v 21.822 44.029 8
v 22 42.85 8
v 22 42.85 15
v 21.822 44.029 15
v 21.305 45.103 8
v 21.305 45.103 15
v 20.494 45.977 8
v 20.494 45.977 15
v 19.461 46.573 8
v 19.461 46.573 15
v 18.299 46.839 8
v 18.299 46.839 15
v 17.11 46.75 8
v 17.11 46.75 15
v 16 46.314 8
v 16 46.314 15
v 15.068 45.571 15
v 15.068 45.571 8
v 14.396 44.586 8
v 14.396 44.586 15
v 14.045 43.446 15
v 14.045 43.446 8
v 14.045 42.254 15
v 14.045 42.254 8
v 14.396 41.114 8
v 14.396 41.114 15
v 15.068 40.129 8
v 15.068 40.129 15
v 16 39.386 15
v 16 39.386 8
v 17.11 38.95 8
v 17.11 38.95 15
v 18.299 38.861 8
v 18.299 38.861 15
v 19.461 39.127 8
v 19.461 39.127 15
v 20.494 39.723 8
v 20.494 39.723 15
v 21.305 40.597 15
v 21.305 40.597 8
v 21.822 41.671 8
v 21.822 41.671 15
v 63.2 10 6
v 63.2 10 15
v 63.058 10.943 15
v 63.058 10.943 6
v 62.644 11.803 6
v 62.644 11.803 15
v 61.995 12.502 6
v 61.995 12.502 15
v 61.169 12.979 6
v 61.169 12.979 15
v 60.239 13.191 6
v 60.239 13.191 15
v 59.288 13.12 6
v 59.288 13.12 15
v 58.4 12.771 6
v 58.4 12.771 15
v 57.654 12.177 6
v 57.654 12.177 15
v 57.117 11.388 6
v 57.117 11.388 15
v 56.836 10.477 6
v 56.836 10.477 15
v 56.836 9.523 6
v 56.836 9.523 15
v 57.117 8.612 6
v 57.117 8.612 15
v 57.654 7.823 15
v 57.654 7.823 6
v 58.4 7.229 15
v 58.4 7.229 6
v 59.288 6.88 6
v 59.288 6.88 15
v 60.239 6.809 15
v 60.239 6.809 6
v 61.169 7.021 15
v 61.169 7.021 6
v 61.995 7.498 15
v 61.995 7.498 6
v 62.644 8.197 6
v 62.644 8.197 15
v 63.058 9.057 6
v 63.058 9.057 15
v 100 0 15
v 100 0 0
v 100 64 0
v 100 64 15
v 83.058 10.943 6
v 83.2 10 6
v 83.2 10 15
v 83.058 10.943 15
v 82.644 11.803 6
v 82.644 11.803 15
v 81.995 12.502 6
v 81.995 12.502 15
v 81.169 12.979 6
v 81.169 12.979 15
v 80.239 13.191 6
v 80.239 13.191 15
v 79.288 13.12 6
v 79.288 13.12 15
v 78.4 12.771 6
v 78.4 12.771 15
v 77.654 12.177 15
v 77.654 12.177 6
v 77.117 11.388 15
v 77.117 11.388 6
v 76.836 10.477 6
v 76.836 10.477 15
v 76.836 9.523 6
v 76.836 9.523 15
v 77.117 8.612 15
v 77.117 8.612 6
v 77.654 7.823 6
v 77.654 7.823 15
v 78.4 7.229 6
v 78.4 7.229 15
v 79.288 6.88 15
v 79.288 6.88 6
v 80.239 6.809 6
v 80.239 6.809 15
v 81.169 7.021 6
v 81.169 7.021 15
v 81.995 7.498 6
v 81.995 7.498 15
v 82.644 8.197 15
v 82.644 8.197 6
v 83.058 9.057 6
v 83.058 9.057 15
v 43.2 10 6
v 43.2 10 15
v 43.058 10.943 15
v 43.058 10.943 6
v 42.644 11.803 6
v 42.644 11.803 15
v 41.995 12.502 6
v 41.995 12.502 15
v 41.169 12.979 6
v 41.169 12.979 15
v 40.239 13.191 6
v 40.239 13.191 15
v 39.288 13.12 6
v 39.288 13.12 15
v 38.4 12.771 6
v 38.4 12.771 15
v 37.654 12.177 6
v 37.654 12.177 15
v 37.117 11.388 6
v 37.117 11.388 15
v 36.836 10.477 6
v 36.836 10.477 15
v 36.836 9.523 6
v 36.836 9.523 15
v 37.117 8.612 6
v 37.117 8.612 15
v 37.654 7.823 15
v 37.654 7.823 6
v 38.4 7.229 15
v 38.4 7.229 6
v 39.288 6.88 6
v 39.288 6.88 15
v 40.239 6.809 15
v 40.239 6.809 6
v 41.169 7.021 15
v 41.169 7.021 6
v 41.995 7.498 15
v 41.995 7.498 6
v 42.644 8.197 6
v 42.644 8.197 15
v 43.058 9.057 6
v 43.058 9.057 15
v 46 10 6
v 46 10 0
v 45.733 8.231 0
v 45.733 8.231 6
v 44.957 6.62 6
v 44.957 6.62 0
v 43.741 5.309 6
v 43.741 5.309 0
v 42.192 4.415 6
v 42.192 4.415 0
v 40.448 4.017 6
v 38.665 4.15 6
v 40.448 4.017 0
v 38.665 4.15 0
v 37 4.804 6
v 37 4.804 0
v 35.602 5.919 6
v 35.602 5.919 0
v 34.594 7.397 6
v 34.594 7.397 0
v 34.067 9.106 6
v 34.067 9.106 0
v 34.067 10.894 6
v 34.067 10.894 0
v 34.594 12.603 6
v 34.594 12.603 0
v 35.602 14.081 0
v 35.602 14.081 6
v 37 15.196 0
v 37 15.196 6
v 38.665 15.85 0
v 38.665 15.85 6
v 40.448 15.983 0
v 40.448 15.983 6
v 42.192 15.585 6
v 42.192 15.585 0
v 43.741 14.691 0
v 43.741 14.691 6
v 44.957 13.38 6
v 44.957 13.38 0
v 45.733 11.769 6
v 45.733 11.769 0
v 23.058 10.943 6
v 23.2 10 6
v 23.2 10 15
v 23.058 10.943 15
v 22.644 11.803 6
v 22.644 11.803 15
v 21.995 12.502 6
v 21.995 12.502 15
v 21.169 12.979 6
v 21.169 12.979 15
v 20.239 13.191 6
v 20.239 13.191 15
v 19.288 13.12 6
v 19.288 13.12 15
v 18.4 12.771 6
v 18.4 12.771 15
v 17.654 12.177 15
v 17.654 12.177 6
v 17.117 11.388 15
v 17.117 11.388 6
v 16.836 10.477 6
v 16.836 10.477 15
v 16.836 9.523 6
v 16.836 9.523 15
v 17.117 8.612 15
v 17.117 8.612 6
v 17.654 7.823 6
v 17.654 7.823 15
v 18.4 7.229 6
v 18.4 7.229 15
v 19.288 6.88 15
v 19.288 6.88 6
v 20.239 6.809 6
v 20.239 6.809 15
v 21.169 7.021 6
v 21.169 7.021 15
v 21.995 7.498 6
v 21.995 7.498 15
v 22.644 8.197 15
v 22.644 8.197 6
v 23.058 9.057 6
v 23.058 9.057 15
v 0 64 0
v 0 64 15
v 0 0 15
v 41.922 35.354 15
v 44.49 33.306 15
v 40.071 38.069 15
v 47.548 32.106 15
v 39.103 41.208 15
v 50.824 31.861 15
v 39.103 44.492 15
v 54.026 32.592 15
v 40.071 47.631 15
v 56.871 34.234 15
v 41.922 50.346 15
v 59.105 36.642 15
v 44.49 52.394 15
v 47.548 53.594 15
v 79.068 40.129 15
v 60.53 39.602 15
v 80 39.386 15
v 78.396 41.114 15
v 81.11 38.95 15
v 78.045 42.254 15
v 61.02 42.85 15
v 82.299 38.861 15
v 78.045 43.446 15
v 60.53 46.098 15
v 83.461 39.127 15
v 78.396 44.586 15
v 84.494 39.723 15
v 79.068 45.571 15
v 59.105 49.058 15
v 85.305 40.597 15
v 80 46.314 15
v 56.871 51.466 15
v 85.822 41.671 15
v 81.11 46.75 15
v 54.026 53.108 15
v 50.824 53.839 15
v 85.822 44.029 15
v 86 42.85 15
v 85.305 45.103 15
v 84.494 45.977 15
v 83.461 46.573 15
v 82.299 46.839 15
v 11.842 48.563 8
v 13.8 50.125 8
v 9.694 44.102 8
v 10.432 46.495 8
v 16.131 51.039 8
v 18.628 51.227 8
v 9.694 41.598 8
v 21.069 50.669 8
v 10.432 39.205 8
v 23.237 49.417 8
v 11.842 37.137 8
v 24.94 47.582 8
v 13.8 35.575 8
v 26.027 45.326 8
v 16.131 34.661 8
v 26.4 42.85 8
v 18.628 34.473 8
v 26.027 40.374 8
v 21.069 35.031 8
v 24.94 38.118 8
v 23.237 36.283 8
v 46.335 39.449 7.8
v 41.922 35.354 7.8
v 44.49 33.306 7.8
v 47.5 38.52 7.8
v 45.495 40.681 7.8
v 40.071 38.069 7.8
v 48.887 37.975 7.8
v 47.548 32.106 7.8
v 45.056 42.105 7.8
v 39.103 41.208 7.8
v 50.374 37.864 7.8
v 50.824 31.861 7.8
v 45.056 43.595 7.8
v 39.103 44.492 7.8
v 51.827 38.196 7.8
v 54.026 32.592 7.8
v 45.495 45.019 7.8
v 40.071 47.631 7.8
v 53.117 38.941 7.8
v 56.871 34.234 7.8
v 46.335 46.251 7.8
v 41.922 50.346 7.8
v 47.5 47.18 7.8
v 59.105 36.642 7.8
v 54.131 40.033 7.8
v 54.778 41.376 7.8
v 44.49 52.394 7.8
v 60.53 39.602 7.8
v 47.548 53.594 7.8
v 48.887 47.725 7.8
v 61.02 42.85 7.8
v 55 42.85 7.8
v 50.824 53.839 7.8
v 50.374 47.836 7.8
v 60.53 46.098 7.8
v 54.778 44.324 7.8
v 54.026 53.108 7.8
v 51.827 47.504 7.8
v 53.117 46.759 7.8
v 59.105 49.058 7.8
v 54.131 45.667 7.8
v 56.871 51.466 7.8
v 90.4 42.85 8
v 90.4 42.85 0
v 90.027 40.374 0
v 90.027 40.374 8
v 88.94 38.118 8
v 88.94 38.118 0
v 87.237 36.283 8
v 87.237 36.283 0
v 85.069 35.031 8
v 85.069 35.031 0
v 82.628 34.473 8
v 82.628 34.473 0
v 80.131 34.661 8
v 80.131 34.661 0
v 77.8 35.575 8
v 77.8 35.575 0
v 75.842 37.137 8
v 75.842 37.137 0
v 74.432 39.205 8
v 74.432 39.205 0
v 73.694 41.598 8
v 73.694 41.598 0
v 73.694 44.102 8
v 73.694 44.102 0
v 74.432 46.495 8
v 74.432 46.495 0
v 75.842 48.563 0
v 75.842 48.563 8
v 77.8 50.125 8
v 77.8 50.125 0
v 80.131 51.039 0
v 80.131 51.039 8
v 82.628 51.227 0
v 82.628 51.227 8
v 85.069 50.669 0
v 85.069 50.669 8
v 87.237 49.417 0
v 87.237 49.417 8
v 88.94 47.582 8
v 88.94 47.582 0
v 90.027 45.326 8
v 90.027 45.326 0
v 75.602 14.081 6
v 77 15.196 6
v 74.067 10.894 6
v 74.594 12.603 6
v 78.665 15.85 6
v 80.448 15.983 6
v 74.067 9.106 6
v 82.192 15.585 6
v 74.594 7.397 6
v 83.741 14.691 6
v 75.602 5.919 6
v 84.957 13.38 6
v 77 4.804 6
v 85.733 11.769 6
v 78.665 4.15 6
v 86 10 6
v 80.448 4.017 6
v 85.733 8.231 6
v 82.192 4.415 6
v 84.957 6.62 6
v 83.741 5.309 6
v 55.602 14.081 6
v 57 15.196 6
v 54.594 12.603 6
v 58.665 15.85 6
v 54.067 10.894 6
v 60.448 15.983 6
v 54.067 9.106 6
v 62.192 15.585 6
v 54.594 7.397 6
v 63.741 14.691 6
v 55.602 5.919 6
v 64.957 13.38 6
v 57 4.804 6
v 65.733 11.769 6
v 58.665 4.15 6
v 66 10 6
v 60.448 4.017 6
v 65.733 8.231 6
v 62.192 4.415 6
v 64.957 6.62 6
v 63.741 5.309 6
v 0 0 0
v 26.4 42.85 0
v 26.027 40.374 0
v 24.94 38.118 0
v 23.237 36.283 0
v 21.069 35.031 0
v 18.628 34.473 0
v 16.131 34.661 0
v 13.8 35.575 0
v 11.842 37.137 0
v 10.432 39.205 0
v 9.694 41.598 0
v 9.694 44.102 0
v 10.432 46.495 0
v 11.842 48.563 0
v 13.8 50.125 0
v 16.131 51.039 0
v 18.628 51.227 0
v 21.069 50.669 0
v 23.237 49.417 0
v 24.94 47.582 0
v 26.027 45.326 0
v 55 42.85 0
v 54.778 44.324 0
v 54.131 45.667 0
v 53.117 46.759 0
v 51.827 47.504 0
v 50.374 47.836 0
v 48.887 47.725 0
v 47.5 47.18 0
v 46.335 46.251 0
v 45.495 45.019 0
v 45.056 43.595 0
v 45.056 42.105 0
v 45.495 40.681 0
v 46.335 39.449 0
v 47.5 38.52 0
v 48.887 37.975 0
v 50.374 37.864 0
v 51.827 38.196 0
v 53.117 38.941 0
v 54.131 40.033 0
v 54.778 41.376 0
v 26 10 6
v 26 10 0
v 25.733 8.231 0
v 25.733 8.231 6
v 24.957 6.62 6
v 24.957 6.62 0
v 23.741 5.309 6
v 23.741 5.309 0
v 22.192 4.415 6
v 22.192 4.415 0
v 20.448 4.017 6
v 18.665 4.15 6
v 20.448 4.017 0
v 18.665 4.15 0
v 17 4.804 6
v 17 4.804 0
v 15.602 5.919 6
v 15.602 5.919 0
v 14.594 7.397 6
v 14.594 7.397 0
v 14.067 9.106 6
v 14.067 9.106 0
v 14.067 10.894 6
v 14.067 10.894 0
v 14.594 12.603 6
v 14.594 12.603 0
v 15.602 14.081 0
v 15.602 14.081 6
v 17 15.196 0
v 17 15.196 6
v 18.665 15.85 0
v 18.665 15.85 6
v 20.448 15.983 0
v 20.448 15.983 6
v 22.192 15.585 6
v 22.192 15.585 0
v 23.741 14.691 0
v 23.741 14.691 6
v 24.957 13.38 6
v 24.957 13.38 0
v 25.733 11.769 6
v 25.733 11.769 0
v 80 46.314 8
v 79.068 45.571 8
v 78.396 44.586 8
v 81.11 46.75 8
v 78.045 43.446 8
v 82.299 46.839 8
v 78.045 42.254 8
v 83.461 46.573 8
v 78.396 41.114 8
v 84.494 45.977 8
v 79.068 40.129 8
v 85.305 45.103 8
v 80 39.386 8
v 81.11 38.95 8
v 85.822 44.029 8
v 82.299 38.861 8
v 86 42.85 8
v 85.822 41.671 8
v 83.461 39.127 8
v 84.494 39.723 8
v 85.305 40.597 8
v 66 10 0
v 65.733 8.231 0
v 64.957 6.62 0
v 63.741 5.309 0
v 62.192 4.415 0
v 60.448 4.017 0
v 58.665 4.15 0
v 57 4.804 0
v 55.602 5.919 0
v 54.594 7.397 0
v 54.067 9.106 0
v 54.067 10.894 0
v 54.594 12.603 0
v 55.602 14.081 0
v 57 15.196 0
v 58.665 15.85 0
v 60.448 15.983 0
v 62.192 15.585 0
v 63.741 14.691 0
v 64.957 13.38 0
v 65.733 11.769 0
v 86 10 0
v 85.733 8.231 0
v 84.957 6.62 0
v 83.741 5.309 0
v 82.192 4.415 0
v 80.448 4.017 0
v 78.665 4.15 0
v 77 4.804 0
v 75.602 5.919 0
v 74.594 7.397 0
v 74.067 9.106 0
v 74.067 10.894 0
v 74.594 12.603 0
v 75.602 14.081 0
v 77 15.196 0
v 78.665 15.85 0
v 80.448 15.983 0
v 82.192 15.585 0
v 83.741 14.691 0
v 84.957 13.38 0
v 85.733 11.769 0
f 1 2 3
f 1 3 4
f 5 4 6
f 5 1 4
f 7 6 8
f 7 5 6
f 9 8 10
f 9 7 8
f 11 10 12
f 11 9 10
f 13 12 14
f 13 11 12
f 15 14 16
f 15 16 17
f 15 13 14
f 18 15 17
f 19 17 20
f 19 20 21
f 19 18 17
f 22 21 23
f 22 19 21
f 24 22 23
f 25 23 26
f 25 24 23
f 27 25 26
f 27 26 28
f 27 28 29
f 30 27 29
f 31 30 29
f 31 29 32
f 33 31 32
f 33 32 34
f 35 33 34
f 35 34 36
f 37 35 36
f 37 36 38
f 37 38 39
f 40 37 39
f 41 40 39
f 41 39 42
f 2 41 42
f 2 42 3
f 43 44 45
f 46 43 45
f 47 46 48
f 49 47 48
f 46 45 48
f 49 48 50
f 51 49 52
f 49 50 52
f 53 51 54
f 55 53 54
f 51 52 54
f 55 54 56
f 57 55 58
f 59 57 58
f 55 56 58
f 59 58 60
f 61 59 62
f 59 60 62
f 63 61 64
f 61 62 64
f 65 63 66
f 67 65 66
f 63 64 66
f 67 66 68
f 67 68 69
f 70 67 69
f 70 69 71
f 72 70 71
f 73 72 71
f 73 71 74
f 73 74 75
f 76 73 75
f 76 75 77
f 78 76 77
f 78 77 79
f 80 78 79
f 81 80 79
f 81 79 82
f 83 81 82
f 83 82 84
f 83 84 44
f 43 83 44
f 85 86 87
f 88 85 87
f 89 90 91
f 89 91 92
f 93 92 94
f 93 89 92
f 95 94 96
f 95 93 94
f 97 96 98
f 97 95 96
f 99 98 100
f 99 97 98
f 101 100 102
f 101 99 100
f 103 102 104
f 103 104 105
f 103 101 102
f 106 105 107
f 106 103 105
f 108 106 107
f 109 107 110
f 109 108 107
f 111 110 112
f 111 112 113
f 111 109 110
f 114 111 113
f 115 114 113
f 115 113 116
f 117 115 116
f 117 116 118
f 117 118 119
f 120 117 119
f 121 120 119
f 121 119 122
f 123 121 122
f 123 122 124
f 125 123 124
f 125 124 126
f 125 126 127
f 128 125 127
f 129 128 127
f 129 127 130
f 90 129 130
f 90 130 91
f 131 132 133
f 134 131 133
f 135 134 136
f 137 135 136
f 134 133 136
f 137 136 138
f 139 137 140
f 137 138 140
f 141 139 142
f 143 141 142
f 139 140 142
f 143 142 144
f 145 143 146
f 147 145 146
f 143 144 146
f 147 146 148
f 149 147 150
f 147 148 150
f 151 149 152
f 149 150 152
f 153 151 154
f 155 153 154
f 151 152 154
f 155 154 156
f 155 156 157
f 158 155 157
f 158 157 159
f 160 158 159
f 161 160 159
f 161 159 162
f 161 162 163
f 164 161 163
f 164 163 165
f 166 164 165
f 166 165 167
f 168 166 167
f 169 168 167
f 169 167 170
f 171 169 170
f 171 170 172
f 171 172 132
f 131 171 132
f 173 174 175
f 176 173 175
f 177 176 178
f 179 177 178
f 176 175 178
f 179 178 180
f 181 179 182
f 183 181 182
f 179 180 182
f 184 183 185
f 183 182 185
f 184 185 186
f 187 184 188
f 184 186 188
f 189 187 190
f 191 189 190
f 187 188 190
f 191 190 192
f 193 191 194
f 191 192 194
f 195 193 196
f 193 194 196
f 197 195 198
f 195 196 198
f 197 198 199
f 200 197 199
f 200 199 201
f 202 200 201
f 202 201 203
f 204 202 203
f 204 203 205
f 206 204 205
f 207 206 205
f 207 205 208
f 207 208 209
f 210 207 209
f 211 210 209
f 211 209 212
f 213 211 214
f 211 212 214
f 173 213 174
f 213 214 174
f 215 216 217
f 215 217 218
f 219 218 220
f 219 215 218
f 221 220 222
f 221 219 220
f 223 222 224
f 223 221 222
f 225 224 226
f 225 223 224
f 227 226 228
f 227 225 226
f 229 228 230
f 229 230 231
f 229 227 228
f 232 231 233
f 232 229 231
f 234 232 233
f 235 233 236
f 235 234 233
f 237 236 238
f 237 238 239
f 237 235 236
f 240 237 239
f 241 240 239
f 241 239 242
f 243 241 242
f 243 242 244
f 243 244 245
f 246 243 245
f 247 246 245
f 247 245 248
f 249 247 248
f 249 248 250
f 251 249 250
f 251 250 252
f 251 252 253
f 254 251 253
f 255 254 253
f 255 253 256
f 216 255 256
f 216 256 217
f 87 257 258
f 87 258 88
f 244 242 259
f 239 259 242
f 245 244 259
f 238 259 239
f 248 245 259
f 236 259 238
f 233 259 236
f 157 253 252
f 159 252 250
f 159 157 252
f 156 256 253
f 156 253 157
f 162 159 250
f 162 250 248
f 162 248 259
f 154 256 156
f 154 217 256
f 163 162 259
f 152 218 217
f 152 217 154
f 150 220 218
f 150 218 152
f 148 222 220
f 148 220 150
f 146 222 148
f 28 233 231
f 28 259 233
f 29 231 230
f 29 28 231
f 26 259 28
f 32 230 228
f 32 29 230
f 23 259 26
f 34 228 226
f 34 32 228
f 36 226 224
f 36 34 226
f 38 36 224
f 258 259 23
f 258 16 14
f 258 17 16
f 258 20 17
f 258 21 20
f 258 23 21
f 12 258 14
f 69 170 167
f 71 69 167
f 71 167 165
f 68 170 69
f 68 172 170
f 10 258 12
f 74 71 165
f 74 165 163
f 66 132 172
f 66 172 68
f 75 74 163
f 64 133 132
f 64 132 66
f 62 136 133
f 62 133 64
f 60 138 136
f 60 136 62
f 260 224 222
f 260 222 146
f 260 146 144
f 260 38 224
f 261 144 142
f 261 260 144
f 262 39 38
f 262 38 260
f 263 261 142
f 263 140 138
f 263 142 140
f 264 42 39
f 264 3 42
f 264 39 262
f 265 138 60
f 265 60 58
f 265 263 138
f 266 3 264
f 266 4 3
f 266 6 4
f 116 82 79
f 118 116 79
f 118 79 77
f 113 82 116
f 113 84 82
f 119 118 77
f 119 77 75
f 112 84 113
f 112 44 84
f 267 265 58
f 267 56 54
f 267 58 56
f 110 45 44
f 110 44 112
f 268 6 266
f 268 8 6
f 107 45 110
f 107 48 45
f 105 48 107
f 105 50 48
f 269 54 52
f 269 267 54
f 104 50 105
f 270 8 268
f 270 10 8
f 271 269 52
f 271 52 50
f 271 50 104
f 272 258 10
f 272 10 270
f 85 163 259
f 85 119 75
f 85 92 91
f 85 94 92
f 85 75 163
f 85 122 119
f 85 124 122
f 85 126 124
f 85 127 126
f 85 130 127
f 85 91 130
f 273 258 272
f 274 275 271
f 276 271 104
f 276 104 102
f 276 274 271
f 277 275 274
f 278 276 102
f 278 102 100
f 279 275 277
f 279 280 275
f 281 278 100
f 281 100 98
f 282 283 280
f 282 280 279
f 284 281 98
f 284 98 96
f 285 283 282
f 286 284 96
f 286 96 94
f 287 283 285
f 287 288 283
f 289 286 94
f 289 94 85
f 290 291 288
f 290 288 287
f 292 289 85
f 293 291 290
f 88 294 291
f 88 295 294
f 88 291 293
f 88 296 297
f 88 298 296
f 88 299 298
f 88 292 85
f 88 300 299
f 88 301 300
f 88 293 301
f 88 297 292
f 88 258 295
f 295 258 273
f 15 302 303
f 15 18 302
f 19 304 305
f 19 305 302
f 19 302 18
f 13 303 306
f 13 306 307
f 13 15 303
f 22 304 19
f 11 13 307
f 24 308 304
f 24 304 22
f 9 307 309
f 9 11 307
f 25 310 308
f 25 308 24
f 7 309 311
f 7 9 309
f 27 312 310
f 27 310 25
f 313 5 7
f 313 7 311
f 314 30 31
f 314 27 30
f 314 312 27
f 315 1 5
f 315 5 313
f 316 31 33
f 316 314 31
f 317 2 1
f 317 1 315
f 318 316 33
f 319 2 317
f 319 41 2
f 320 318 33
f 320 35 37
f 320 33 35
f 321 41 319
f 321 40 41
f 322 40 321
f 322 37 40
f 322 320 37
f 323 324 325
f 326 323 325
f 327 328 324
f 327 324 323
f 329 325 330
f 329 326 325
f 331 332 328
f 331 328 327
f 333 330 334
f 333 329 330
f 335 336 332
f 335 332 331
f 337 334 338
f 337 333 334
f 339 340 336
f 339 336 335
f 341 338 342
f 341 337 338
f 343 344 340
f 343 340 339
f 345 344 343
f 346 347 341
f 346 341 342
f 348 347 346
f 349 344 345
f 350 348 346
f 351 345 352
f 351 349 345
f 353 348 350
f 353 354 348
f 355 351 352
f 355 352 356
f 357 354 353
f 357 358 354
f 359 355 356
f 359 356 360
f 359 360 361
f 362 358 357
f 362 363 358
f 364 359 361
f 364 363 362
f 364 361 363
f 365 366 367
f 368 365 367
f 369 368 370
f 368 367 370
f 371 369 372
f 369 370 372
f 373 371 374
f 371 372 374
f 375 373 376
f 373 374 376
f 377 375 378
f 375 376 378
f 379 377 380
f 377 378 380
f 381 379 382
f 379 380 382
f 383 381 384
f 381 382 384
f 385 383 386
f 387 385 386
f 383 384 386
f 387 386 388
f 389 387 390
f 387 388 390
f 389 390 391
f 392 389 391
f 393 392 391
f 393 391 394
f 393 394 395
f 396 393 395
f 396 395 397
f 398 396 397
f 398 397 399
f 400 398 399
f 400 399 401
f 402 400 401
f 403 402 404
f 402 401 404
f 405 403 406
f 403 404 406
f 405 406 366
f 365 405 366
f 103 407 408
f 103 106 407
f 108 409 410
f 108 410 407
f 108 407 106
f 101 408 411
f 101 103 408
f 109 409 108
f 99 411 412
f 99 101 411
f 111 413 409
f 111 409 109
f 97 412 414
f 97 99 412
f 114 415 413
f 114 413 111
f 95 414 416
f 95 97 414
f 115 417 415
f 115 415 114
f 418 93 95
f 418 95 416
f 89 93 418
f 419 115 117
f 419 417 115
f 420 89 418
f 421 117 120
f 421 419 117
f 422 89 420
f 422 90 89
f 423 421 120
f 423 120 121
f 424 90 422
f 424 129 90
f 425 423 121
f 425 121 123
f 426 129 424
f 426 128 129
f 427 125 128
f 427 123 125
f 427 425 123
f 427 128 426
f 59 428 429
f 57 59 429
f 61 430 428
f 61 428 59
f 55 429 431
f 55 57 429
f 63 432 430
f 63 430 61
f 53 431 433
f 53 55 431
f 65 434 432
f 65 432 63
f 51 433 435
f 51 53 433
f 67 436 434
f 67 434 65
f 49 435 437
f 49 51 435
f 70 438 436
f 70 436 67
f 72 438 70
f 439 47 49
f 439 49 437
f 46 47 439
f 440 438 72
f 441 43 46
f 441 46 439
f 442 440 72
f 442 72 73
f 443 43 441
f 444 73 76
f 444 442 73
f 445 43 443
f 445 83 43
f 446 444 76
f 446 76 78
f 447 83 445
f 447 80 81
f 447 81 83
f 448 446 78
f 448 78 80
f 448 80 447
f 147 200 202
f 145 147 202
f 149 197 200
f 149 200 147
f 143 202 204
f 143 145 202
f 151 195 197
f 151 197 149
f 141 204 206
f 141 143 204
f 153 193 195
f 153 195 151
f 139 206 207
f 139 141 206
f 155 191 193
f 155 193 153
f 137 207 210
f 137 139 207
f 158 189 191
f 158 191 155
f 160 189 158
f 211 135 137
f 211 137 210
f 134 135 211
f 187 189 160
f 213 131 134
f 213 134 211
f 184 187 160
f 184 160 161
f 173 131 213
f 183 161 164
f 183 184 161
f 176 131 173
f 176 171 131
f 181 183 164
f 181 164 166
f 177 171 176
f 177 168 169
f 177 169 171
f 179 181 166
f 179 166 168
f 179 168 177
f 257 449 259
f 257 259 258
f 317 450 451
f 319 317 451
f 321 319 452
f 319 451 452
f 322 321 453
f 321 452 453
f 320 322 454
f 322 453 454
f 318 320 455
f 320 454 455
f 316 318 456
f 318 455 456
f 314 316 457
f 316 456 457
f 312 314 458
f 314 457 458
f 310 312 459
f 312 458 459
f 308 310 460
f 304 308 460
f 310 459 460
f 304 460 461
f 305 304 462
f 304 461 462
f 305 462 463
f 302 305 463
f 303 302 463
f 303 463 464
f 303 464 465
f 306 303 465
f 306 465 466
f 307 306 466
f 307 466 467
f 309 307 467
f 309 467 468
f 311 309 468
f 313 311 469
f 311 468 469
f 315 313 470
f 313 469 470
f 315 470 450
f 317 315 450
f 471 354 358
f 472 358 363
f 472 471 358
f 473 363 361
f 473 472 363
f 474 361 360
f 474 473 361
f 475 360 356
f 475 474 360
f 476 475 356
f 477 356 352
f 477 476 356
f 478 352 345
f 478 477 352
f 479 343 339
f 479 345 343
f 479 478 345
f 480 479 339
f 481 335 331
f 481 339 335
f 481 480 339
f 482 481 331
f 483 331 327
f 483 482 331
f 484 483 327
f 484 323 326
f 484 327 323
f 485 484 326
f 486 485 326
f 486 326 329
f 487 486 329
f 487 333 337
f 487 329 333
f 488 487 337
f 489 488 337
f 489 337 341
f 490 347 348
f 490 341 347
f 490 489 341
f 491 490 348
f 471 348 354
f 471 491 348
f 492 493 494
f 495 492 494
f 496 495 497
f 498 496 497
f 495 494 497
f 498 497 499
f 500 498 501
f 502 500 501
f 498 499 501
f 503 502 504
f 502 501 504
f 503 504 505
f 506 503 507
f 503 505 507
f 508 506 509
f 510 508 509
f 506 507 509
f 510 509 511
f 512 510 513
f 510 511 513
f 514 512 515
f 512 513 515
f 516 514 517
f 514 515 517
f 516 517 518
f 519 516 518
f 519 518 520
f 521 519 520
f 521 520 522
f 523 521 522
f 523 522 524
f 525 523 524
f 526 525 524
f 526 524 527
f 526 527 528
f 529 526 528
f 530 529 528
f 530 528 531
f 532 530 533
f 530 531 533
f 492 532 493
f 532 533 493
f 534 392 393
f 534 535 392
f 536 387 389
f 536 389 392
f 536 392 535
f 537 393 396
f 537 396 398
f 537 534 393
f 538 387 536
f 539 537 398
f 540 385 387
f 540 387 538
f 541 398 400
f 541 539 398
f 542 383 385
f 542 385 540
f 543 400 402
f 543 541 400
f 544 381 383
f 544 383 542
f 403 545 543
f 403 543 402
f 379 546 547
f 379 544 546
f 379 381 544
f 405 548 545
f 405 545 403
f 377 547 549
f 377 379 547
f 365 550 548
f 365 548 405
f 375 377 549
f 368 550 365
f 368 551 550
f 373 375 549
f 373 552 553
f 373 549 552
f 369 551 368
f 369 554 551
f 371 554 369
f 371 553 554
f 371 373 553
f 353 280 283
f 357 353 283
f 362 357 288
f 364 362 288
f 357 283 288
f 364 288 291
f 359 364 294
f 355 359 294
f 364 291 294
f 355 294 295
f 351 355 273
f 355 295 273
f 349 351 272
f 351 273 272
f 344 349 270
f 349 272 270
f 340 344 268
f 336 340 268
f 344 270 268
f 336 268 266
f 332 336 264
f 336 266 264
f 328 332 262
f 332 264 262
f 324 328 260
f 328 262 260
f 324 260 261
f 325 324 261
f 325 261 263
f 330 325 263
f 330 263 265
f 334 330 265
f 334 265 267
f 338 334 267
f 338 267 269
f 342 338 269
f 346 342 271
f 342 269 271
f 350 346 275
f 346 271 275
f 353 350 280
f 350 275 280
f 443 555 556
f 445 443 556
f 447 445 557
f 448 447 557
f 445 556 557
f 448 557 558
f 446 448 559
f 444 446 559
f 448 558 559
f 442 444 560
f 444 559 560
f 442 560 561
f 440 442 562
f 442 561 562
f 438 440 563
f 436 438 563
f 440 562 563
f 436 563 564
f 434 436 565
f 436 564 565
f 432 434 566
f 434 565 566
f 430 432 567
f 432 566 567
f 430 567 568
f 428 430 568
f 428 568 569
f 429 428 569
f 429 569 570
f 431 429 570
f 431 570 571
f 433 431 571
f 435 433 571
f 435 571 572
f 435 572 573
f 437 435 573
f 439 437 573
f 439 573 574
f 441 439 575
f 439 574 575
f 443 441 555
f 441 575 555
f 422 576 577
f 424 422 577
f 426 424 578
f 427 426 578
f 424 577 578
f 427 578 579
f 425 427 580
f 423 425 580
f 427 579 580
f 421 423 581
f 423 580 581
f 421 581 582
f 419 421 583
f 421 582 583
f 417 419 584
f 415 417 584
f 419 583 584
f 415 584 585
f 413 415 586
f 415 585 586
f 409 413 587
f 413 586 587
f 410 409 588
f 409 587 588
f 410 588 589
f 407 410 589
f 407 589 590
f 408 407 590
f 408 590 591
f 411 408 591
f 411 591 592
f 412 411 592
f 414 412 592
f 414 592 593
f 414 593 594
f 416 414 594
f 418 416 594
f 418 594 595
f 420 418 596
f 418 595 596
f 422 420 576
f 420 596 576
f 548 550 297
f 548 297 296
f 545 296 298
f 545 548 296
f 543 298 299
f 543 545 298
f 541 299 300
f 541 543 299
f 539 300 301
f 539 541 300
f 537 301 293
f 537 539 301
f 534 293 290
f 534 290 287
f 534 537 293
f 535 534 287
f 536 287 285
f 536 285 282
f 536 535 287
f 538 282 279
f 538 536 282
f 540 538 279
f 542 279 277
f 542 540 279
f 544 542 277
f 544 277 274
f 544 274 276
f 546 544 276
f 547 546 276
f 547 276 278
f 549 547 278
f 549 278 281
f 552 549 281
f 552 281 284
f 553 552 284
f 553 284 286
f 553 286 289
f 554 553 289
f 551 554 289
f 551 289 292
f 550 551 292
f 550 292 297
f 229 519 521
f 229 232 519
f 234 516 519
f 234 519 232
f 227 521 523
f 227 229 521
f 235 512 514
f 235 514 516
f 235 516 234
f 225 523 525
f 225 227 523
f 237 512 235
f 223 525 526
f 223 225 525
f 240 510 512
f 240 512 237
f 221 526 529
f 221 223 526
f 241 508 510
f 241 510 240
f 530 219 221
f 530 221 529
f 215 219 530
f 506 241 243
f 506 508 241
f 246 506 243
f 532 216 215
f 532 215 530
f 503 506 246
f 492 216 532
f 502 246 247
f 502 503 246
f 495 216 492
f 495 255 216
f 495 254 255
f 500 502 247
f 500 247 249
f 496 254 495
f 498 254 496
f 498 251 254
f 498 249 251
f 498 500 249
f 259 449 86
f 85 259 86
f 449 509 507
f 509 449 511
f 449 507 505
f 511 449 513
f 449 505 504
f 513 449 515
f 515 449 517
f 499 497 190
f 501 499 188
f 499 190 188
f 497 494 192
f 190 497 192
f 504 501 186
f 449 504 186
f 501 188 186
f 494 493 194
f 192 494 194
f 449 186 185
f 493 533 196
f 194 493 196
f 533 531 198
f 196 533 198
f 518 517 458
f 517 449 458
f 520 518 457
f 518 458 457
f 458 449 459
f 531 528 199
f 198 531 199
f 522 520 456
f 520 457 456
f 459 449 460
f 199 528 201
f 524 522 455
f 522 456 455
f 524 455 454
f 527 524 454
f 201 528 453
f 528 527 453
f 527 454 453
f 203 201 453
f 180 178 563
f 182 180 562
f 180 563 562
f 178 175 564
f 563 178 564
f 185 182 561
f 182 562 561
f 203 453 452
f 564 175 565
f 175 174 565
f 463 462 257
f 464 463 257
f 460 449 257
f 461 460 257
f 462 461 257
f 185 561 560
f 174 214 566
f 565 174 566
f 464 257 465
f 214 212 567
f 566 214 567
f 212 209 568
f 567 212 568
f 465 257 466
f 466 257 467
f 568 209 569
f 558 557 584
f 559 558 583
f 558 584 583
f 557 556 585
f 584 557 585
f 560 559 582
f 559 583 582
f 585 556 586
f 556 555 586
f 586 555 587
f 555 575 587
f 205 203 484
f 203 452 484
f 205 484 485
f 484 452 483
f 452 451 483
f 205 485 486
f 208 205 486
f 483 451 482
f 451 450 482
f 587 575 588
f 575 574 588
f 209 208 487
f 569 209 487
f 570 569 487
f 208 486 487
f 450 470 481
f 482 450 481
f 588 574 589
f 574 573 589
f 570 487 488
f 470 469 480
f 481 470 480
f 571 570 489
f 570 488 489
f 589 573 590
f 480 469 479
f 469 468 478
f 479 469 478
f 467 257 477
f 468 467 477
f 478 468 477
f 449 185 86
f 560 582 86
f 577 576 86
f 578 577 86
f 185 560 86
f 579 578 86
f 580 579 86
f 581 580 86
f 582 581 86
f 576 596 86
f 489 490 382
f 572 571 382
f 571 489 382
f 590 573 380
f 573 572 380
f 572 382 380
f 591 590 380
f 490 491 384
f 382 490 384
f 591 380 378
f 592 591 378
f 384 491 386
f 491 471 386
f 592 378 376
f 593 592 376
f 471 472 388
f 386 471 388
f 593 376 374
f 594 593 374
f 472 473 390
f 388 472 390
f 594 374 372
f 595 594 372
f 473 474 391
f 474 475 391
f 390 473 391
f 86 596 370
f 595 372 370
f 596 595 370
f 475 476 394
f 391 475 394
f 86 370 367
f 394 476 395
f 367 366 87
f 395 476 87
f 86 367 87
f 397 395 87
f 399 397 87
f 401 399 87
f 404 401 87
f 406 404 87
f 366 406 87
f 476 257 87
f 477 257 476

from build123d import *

# Parameters (mm, degrees)
SKETCH_W        = 100
SKETCH_H        = 64
SKETCH_R        = 5
SKETCH_R_2      = 3.2
SKETCH_R_3      = 4
PAD_DEPTH       = 15
SKETCH001_R     = 11.02
POCKET_DEPTH    = 7.2
SKETCH002_R     = 6
POCKET001_DEPTH = 6
SKETCH003_R     = 3.2
POCKET002_DEPTH = 15
SKETCH004_R     = 8.4
POCKET003_DEPTH = 8


with BuildPart() as part:
    # Sketch → Pad (new body)
    with BuildSketch(Plane.XY):
        with Locations((50, 32)):
            Rectangle(SKETCH_W, SKETCH_H)
        with Locations((50, 42.85)):
            Circle(SKETCH_R, mode=Mode.SUBTRACT)
        with Locations((20, 10)):
            Circle(SKETCH_R_2, mode=Mode.SUBTRACT)
        with Locations((80, 10)):
            Circle(SKETCH_R_2, mode=Mode.SUBTRACT)
        with Locations((82, 42.85)):
            Circle(SKETCH_R_3, mode=Mode.SUBTRACT)
        with Locations((18, 42.85)):
            Circle(SKETCH_R_3, mode=Mode.SUBTRACT)
    extrude(amount=PAD_DEPTH)

    # Sketch001 (on Face11 of Pad) → Pocket (cut)
    with BuildSketch(Plane.XY.offset(15)):
        with Locations((50, 42.85)):
            Circle(SKETCH001_R)
    extrude(amount=-POCKET_DEPTH, mode=Mode.SUBTRACT)

    # Sketch002 (on Face4 of Pocket) → Pocket001 (cut)
    with BuildSketch(Plane(origin=(0, 0, 0), x_dir=(1, 0, 0), z_dir=(0, 0, -1))):
        with Locations((20, -10)):
            Circle(SKETCH002_R)
        with Locations((80, -10)):
            Circle(SKETCH002_R)
        with Locations((40, -10)):
            Circle(SKETCH002_R)
        with Locations((60, -10)):
            Circle(SKETCH002_R)
    extrude(amount=-POCKET001_DEPTH, mode=Mode.SUBTRACT)

    # Sketch003 (on Face5 of Pocket001) → Pocket002 (cut)
    with BuildSketch(Plane.XY.offset(15)):
        with Locations((40, 10)):
            Circle(SKETCH003_R)
        with Locations((60, 10)):
            Circle(SKETCH003_R)
    extrude(amount=-POCKET002_DEPTH, mode=Mode.SUBTRACT)

    # Sketch004 (on Face4 of Pocket002) → Pocket003 (cut)
    with BuildSketch(Plane(origin=(0, 0, 0), x_dir=(1, 0, 0), z_dir=(0, 0, -1))):
        with Locations((18, -42.85)):
            Circle(SKETCH004_R)
        with Locations((82, -42.85)):
            Circle(SKETCH004_R)
    extrude(amount=-POCKET003_DEPTH, mode=Mode.SUBTRACT)


solid = part.part
